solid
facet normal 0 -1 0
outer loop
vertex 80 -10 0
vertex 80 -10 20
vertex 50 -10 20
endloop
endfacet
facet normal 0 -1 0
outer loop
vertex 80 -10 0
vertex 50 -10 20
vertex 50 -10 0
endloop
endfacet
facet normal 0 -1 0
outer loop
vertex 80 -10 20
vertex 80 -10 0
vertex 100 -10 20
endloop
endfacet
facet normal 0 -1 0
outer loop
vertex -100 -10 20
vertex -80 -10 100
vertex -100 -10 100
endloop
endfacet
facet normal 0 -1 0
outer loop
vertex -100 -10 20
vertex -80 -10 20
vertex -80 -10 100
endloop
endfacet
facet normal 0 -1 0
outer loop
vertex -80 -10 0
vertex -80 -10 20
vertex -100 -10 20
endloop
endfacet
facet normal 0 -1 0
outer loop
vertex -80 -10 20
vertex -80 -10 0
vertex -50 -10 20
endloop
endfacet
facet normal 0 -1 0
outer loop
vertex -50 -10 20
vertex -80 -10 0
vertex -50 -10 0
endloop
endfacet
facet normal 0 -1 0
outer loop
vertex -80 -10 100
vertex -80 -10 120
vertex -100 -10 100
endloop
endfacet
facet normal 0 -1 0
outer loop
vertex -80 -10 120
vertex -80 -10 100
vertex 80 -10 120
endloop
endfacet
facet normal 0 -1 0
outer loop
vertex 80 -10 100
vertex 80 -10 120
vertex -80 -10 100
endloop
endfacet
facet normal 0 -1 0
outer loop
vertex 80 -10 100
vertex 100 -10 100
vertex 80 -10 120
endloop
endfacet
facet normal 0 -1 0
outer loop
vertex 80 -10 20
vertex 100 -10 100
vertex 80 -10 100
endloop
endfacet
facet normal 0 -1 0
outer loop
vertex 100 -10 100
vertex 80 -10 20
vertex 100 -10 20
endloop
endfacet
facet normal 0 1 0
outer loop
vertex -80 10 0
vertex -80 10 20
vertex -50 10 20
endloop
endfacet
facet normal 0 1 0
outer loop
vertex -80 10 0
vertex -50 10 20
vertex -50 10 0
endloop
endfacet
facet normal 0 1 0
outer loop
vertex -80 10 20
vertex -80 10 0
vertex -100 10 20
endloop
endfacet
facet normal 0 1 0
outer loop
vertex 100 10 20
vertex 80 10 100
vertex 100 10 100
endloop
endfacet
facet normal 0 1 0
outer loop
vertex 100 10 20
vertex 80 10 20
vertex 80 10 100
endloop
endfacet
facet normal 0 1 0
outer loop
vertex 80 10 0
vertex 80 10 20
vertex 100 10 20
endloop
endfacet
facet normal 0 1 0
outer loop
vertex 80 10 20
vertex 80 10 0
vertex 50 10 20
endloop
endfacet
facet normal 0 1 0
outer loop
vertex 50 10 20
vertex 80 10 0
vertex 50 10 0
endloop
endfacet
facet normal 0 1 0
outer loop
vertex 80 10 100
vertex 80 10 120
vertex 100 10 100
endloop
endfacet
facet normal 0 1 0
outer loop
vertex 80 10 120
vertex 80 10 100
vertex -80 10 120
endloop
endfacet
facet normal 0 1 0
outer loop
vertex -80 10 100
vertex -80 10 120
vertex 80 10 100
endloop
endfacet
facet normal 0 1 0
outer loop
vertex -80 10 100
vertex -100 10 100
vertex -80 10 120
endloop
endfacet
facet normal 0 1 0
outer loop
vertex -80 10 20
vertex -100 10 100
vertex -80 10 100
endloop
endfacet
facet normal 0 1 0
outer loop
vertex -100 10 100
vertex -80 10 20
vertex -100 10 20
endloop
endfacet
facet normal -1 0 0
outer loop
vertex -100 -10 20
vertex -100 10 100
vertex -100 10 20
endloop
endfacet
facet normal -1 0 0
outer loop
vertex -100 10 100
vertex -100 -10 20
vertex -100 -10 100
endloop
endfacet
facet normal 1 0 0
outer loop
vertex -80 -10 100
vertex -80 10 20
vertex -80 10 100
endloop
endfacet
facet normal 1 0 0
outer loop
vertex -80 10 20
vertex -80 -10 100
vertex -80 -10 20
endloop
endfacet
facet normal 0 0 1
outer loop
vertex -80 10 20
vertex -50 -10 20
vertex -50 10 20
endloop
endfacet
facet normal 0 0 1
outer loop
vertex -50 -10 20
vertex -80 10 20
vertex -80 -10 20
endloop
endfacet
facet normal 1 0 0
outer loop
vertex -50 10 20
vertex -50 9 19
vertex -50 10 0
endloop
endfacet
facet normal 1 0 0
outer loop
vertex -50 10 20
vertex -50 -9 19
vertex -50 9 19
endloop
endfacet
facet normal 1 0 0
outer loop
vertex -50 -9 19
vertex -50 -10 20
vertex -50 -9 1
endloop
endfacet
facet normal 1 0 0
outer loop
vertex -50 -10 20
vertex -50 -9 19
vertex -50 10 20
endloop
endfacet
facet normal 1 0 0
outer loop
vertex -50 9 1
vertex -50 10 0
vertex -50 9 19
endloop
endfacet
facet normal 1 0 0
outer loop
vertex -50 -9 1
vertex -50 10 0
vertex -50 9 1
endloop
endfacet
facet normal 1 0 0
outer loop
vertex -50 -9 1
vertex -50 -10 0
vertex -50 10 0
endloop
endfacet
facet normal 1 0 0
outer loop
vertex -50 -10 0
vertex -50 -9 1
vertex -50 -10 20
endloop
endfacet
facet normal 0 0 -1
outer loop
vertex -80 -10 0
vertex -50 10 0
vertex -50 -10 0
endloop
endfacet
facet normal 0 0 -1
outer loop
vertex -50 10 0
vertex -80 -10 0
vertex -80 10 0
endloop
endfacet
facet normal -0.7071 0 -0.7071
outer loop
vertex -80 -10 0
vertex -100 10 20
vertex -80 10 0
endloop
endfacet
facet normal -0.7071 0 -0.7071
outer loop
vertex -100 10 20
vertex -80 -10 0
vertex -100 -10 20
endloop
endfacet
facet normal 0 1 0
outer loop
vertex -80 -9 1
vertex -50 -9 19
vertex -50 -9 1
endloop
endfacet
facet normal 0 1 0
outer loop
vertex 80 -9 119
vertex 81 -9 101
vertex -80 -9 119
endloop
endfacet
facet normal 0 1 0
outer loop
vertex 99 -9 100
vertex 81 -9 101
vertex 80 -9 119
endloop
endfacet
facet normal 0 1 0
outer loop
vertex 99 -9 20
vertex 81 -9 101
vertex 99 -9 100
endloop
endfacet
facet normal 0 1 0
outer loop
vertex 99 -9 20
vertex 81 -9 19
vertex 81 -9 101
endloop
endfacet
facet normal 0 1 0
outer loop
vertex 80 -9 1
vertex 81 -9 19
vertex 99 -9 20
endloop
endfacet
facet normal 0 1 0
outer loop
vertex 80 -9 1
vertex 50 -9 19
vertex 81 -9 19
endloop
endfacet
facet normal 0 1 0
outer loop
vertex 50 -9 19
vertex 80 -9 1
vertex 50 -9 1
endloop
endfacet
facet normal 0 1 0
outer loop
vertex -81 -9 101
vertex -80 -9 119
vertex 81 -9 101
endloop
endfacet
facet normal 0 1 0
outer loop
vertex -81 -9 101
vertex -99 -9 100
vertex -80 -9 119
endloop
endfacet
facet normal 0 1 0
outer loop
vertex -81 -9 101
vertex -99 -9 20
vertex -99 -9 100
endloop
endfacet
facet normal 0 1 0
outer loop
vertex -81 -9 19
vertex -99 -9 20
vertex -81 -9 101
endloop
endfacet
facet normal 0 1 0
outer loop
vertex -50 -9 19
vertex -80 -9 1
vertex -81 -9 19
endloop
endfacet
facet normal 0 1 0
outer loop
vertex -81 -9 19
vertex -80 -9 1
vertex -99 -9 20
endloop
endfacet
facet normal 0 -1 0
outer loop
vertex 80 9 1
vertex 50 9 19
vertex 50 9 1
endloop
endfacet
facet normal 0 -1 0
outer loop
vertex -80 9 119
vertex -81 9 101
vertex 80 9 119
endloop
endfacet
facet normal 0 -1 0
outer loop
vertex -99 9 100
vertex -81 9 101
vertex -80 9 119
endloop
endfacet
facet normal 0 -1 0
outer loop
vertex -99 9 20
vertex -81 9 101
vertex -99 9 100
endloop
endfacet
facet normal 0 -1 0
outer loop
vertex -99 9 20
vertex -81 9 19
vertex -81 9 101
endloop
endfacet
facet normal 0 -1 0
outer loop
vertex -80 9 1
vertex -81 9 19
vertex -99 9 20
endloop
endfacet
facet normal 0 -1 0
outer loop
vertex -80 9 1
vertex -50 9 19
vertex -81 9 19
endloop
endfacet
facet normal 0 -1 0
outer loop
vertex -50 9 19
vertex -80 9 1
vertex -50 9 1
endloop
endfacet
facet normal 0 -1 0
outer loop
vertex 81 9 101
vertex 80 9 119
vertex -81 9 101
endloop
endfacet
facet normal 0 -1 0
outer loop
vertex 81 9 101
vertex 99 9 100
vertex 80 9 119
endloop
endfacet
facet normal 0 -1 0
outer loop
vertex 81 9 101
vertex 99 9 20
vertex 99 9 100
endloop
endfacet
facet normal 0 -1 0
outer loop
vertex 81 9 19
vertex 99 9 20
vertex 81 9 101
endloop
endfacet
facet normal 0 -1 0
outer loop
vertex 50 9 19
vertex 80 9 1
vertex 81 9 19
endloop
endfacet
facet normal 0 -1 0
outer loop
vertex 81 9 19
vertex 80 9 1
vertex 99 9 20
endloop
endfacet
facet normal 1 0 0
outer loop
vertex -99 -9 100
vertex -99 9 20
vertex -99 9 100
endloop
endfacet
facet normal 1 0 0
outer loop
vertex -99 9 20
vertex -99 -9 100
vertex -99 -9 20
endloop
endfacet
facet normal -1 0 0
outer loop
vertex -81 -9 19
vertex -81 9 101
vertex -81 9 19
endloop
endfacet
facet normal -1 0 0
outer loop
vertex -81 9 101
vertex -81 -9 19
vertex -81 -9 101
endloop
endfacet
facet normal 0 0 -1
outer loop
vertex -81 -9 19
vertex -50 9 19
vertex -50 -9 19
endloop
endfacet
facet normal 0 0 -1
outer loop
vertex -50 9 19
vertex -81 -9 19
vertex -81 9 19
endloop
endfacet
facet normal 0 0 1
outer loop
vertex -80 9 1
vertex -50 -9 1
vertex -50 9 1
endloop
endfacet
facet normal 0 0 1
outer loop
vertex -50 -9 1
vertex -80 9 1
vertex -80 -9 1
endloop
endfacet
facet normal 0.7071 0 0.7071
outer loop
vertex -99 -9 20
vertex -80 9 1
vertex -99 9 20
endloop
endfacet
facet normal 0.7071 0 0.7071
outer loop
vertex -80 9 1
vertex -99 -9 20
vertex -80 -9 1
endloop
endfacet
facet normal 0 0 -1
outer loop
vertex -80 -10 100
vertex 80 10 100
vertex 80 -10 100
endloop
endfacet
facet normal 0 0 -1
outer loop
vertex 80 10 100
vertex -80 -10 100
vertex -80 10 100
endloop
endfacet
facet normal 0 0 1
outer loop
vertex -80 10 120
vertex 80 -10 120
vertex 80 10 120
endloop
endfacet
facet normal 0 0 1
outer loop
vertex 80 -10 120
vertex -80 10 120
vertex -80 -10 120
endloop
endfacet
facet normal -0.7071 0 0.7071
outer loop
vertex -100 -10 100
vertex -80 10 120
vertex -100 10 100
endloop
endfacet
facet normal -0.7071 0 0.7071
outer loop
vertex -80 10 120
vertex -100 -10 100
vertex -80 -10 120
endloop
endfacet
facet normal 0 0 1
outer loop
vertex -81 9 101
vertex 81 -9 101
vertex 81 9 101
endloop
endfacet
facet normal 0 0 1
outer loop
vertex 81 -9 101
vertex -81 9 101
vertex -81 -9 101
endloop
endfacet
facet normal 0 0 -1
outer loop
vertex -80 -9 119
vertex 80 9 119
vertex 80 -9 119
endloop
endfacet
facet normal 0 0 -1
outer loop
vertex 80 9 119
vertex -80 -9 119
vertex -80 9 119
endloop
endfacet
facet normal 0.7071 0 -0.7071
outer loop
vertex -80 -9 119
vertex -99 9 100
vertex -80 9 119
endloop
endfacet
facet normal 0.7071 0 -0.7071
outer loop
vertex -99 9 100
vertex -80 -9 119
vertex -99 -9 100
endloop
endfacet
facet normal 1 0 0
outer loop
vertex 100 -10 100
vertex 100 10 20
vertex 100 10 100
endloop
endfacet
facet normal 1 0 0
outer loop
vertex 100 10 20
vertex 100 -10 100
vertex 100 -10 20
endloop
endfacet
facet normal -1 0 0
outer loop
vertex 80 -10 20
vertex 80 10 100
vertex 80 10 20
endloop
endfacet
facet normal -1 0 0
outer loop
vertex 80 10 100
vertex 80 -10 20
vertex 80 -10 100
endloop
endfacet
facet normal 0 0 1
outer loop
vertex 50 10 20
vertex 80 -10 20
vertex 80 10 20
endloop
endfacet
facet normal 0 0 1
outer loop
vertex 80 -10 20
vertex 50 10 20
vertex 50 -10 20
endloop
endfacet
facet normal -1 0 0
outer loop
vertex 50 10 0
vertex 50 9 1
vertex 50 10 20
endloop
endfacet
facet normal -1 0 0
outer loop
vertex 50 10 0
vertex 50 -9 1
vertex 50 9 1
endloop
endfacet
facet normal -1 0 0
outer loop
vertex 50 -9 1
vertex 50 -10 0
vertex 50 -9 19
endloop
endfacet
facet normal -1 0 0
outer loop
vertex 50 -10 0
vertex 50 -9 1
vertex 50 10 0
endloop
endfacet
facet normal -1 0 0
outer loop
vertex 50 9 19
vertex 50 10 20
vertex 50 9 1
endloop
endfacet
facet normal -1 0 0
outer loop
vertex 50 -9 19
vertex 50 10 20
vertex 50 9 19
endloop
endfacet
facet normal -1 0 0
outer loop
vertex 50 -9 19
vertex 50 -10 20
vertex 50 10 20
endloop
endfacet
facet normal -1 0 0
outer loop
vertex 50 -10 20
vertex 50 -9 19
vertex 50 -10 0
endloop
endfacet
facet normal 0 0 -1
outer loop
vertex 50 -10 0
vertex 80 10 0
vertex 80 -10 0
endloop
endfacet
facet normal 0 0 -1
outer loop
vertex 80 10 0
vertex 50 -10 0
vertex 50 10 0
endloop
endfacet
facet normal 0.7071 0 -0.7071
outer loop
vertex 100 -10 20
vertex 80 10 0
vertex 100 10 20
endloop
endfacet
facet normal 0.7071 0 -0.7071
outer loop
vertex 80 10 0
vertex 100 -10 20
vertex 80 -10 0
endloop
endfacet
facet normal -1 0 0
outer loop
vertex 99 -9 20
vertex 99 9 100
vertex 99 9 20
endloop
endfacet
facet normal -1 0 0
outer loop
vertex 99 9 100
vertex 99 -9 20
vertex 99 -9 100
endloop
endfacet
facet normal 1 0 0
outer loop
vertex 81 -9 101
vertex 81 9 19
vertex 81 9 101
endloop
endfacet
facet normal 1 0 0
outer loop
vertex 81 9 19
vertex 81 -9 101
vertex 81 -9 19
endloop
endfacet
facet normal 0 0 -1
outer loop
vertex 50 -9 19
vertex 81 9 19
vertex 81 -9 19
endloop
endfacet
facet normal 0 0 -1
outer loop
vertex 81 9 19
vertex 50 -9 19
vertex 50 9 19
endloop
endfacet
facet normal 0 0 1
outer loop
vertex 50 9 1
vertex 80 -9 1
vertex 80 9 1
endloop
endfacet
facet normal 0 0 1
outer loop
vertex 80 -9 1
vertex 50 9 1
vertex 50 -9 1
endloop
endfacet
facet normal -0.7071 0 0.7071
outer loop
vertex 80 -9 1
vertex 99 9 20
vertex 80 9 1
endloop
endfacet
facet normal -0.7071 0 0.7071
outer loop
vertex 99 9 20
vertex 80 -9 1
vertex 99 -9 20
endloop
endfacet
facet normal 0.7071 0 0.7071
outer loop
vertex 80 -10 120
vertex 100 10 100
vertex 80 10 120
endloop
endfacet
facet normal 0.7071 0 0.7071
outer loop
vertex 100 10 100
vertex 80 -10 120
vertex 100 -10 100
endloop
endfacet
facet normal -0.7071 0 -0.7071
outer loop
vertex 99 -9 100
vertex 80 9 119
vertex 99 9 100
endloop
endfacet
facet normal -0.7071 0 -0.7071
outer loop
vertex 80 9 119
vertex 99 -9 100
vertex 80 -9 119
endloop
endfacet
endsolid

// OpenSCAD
// file: half_periscope.scad
diameter=10;
horizontal_leg=3;
vertical_leg=7;
wall_thickness=0.5;

module half_periscope(
    d=diameter,
    h=horizontal_leg,
    v=vertical_leg,
    w=wall_thickness
) {
  translate([-d/2,-(h+d/2),-d-v])
    rotate([90,0,90])
        difference(){
            linear_extrude(d)
                polygon([[0,0], [h,0], [d+h,d], [d+h,d+v],[h,d+v],[h,d],[0,d]]);
            translate([0,0,w])
                linear_extrude(d-w-w)
                    polygon([[-w,w], [h,w], [d+h-w,d], [d+h-w,d+v+w],[h+w,d+v+w],[h+w,d-w],[-w,d-w]]);
    }  
}

half_periscope();
// file: periscope.scad
diameter=20;
top_hl=5;
bottom_hl=2;
height=60;
wall_thickness=1;
twist=180;

use <half_periscope.scad>

module periscope(
    d=diameter,
    th=top_hl,
    bh=bottom_hl,
    h=height,
    w=wall_thickness,
    t=twist
) {
    translate([0,0,h/2])
    union() {
        half_periscope(d,bh,(h/2)-d,w);
        translate([0,0,-w])
            rotate([0,180,t])
                half_periscope(d,th,((h/2)-d)+w,w);
    }
}

periscope();
// main file
width=200;
height=120;
gap=100;
diameter=20;
wall_thickness=1;

use <periscope.scad>

module double_periscope(
    w=width,
    h=height,
    g=gap,
    d=diameter,
    t=wall_thickness
){
    module half(r) {
        rotate([0,0,r])
        translate([0,(w-d)/2,0])
            periscope(d,w/2-d+t,(w-g)/2-d,h,t,0);
    }
    
    union() {
        half(90);
        half(270); 
    }
}

double_periscope();
